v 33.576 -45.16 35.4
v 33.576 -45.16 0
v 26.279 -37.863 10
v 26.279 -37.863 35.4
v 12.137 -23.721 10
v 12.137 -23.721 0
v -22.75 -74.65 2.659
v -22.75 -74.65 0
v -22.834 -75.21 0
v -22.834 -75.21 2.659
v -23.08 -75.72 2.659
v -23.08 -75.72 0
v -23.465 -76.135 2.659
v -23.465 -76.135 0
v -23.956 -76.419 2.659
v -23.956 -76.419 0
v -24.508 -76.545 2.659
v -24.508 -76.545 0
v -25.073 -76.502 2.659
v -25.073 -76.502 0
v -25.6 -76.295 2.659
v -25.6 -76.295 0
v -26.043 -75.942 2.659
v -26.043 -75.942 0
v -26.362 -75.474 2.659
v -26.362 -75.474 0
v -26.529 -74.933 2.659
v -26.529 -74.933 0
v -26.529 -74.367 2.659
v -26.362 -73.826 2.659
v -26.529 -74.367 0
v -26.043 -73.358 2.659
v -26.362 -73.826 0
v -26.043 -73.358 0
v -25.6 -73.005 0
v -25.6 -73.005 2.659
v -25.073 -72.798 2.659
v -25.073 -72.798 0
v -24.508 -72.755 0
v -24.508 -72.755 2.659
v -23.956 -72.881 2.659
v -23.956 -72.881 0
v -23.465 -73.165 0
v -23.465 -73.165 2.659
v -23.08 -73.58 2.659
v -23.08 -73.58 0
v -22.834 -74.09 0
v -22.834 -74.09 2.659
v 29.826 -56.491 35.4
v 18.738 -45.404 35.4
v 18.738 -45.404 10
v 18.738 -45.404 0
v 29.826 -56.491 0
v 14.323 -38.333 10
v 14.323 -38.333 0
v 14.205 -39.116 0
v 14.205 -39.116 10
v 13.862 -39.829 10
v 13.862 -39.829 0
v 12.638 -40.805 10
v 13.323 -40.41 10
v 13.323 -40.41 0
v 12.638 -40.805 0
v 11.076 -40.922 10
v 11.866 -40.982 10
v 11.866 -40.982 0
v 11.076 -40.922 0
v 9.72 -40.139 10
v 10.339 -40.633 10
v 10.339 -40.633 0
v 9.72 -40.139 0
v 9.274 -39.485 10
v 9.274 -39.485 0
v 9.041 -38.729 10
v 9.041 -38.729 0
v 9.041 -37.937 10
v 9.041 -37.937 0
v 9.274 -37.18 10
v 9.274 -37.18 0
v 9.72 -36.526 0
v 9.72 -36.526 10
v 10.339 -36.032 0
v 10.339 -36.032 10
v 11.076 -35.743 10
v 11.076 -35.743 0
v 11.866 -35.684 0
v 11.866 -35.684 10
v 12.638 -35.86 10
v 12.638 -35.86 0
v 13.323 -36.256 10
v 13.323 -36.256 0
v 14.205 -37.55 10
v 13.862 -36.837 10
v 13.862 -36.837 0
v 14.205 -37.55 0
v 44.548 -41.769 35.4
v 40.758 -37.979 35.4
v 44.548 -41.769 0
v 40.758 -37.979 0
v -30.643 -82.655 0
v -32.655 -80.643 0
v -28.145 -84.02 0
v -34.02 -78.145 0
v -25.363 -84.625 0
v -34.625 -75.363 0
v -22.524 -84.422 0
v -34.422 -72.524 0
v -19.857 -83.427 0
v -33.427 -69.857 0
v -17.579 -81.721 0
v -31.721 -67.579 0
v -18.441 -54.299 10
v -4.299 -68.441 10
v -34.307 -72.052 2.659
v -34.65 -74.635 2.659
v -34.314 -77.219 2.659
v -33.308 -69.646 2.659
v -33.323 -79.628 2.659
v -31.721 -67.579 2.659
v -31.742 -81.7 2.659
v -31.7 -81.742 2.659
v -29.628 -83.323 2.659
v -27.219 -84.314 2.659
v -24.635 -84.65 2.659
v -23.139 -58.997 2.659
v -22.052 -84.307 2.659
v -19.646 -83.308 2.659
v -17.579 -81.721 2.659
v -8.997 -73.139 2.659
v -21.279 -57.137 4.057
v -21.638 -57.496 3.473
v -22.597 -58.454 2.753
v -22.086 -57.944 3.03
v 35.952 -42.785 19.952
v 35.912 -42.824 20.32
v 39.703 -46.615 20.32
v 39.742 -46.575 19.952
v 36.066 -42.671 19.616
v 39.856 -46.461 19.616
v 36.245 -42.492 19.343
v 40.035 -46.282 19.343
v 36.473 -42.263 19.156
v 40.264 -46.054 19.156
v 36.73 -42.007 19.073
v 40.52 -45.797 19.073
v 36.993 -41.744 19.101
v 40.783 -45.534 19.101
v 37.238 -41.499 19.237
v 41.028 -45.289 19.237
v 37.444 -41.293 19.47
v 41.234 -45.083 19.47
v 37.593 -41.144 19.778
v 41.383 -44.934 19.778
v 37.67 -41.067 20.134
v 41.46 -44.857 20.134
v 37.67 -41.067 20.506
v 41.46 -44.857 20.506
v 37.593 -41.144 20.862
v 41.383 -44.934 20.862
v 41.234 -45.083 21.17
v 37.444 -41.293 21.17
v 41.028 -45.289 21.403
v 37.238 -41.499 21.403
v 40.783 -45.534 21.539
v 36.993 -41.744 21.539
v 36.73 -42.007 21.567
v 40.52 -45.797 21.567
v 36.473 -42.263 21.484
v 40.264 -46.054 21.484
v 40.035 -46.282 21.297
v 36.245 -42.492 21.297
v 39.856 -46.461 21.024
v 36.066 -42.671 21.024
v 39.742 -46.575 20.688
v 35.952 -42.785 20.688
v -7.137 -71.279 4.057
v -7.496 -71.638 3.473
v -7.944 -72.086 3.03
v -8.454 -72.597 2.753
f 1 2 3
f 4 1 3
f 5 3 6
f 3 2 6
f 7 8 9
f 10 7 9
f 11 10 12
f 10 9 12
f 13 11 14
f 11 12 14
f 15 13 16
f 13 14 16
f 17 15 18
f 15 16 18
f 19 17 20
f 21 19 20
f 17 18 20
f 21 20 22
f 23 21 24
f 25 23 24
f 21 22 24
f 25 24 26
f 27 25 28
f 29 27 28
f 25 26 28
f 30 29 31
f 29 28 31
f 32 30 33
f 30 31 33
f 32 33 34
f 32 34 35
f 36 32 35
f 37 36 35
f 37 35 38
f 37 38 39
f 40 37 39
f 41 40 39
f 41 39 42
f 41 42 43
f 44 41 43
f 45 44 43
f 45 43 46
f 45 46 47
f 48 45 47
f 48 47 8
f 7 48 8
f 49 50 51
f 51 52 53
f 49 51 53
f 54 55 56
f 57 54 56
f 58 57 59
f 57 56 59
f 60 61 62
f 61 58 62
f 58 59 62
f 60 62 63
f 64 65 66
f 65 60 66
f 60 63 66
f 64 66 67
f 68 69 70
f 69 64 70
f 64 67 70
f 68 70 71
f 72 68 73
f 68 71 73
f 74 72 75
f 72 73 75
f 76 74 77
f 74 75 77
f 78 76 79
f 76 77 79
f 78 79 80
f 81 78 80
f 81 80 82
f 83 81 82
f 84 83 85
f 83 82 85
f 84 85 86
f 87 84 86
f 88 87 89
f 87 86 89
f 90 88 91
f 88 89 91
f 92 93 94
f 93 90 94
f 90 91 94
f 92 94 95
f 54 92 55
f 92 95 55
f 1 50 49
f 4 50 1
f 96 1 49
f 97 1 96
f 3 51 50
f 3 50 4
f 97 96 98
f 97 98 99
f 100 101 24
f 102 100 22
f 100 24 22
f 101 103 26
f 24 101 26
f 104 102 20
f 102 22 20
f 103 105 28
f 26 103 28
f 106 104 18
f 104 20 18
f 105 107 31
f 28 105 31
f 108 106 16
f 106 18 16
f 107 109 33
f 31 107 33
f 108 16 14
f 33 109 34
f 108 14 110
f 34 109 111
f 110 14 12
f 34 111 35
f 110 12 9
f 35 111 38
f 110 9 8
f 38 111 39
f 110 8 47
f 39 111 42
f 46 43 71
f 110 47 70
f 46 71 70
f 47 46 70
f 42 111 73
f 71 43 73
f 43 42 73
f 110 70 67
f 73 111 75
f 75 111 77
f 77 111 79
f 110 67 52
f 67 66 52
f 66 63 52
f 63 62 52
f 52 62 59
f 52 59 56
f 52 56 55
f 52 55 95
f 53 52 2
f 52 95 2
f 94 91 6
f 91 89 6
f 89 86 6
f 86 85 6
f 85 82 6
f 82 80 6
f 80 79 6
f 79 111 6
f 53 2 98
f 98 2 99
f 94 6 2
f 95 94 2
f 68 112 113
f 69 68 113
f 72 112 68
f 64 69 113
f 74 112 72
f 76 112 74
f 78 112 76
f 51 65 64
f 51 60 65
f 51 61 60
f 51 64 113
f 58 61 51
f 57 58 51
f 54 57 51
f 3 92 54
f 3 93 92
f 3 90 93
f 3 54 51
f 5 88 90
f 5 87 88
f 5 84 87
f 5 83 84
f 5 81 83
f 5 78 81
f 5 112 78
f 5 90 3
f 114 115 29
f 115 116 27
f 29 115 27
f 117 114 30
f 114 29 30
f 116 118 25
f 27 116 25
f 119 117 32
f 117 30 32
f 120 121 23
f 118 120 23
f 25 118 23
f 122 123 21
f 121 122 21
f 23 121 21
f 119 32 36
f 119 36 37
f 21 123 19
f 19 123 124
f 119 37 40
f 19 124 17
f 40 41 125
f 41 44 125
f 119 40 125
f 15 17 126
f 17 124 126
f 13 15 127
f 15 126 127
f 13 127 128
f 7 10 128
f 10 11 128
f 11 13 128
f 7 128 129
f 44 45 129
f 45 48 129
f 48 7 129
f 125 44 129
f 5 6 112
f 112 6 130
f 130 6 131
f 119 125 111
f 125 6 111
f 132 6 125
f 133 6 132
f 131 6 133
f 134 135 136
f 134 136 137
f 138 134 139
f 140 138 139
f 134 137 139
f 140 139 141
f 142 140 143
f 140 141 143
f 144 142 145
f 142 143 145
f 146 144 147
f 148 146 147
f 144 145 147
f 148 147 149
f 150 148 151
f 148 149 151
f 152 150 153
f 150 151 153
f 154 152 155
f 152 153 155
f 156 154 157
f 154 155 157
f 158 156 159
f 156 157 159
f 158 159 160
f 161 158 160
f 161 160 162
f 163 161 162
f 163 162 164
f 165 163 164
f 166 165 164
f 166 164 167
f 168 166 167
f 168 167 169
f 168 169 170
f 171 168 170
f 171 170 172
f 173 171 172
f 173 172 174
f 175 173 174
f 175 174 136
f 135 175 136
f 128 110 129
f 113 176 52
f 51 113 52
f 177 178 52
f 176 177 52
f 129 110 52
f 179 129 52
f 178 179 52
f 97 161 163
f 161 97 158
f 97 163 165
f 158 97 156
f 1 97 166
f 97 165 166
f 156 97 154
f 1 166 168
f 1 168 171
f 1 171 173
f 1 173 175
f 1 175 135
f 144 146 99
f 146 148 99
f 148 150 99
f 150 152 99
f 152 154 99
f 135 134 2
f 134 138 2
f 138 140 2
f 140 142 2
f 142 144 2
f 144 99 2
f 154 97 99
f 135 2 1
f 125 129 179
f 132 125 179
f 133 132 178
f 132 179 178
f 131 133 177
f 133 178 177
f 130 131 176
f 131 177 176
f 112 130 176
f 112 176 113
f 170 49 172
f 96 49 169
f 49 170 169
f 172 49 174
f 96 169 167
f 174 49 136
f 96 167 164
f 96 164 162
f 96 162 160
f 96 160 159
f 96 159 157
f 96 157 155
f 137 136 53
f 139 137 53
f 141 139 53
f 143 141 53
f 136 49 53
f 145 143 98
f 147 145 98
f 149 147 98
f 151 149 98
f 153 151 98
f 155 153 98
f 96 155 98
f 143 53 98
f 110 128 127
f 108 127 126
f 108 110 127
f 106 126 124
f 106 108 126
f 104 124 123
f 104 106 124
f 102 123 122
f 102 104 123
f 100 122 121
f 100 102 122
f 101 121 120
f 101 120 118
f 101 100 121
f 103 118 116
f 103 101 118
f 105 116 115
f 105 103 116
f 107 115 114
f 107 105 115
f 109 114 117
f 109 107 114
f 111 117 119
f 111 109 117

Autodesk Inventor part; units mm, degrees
ref_plane "YZ Plane" through (0, 0, 0) normal (1, 0, 0) x (0, 1, 0)
ref_plane "XZ Plane" through (0, 0, 0) normal (0, 1, 0) x (-1, 0, 0)
ref_plane "XY Plane" through (0, 0, 0) normal (0, 0, 1) x (1, 0, 0)
ref_plane "Work Plane1" through (0, 0, 0) normal (0, 0, 1) x (1, 0, 0)
sketch "Sketch1" plane through (0, 0, 0) normal (0, 0, 1) x (1, 0, 0)
  line L0 (-41.9, 57.6) -> (-41.9, 91.9) construction
  line L1 (-41.9, -91.9) -> (41.9, -91.9) construction
  line L2 (-7.4, -59.4) -> (-7.4, -67.3) construction
  circle A0 centre (-24.65, -74.65) radius 17.25 construction
  circle A1 centre (-24.65, -74.65) radius 6.3062 construction
  circle A2 centre (-24.65, -74.65) radius 1.9
  line L3 (-24.65, -74.65) -> (11.6672, -38.3328) construction
  line L4 (-17.5789, -81.7211) -> (18.7383, -45.4039)
  line L5 (4.5961, -31.2617) -> (-31.7211, -67.5789)
  arc A3 (-31.7211, -67.5789) -> (-17.5789, -81.7211) centre (-24.65, -74.65) ccw
  arc A4 (18.7383, -45.4039) -> (4.5961, -31.2617) centre (11.6672, -38.3328) ccw construction
  circle A5 centre (11.6672, -38.3328) radius 2.6562
  line L6 (4.5961, -31.2617) -> (12.137, -23.7208)
  line L7 (3.5996, -14.8432) -> (9.3348, -8.7305) construction
  line L8 (33.237, -42.6502) -> (38.9722, -36.5375) construction
  line L9 (12.137, -23.7208) -> (33.5765, -45.1603) construction
  line L10 (33.5765, -45.1603) -> (12.137, -23.7208)
  line L11 (18.7383, -45.4039) -> (29.8258, -56.4914)
  line L12 (29.8258, -56.4914) -> (44.5482, -41.7691)
  line L13 (44.5482, -41.7691) -> (40.758, -37.9789)
  line L14 (40.758, -37.9789) -> (33.5765, -45.1603)
  point P0 (0, 0)
  point P1 (41.9, -91.9)
  point P2 (-6.4914, -56.4914)
  dimension "d0" = 3.8
  dimension "d3" = 10
  dimension "d4" = 45
  dimension "d5" = 40.64
  dimension "d6" = 20.32
extrude "Extrusion1" add sketch "Sketch1" along normal blind 10
sketch "Sketch2" plane through (0, 0, 10) normal (0, 0, 1) x (1, 0, 0)
  circle A0 centre (-24.65, -74.65) radius 1.9 projected
  circle A1 centre (11.6672, -38.3328) radius 2.6562 projected
  line L0 (-17.5789, -81.7211) -> (18.7383, -45.4039) projected
  line L1 (18.7383, -45.4039) -> (29.8258, -56.4914) projected
  line L2 (29.8258, -56.4914) -> (44.5482, -41.7691) projected
  line L3 (44.5482, -41.7691) -> (40.758, -37.9789) projected
  line L4 (40.758, -37.9789) -> (33.5765, -45.1603) projected
  line L5 (33.5765, -45.1603) -> (12.137, -23.7208) projected
  line L6 (12.137, -23.7208) -> (-31.7211, -67.5789) projected
  arc A2 (-31.7211, -67.5789) -> (-17.5789, -81.7211) centre (-24.65, -74.65) ccw projected
  line L7 (44.5482, -41.7691) -> (40.758, -37.9789) projected
  line L8 (44.5482, -41.7691) -> (40.758, -37.9789)
  line L9 (40.758, -37.9789) -> (26.0356, -52.7012)
  line L10 (26.0356, -52.7012) -> (29.8258, -56.4914)
  line L11 (29.8258, -56.4914) -> (44.5482, -41.7691)
  line L12 (18.7383, -45.4039) -> (29.8258, -56.4914) projected
  line L13 (26.0356, -52.7012) -> (18.7383, -45.4039)
  line L14 (18.7383, -45.4039) -> (26.2792, -37.863)
  line L15 (26.2792, -37.863) -> (33.5765, -45.1603)
  line L16 (33.5765, -45.1603) -> (26.0356, -52.7012)
  point P0 (0, 0)
extrude "Extrusion2" add sketch "Sketch2" along normal blind 25.4 contours L14 L5 L9 L1 | L9 L4 L3 L2 L1
sketch "Sketch3" plane through (44.5482, -41.7691, 35.4) normal (0.7071068, -0.7071068, 0) x (-0.7071068, -0.7071068, 0)
  circle A0 centre (5.6027, 15.08) radius 1.25
  line L0 (20.8205, 35.4) -> (0, 35.4) projected
  point P0 (1.9651, 35.4)
  dimension "d9" = 2.5
  dimension "d10" = 20.32
extrude "Extrusion3" cut sketch "Sketch3" against normal blind 25.4
sketch "Sketch4" plane through (-17.5789, -81.7211, 10) normal (0.7071068, -0.7071068, 0) x (-0.7071068, -0.7071068, 0)
  line L0 (10, 10) -> (10, 0) projected
  line L1 (10, 7.3414) -> (-12.1363, 7.3414)
  line L2 (-14.7676, 5.9432) -> (-18.7808, 0)
  line L3 (0, 0) -> (-51.3603, 0) projected
  arc A0 (-12.1363, 7.3414) -> (-14.7676, 5.9432) centre (-12.1363, 4.1664) ccw
  line L4 (-18.7808, 0) -> (10, 0)
  line L5 (10, 7.3414) -> (10, 0)
  point P0 (-70.2157, 10)
  dimension "d13" = 3.175
extrude "Extrusion4" cut sketch "Sketch4" against normal blind 25.4
properties part number "30_CUBE_openSIM_Laserarm"
